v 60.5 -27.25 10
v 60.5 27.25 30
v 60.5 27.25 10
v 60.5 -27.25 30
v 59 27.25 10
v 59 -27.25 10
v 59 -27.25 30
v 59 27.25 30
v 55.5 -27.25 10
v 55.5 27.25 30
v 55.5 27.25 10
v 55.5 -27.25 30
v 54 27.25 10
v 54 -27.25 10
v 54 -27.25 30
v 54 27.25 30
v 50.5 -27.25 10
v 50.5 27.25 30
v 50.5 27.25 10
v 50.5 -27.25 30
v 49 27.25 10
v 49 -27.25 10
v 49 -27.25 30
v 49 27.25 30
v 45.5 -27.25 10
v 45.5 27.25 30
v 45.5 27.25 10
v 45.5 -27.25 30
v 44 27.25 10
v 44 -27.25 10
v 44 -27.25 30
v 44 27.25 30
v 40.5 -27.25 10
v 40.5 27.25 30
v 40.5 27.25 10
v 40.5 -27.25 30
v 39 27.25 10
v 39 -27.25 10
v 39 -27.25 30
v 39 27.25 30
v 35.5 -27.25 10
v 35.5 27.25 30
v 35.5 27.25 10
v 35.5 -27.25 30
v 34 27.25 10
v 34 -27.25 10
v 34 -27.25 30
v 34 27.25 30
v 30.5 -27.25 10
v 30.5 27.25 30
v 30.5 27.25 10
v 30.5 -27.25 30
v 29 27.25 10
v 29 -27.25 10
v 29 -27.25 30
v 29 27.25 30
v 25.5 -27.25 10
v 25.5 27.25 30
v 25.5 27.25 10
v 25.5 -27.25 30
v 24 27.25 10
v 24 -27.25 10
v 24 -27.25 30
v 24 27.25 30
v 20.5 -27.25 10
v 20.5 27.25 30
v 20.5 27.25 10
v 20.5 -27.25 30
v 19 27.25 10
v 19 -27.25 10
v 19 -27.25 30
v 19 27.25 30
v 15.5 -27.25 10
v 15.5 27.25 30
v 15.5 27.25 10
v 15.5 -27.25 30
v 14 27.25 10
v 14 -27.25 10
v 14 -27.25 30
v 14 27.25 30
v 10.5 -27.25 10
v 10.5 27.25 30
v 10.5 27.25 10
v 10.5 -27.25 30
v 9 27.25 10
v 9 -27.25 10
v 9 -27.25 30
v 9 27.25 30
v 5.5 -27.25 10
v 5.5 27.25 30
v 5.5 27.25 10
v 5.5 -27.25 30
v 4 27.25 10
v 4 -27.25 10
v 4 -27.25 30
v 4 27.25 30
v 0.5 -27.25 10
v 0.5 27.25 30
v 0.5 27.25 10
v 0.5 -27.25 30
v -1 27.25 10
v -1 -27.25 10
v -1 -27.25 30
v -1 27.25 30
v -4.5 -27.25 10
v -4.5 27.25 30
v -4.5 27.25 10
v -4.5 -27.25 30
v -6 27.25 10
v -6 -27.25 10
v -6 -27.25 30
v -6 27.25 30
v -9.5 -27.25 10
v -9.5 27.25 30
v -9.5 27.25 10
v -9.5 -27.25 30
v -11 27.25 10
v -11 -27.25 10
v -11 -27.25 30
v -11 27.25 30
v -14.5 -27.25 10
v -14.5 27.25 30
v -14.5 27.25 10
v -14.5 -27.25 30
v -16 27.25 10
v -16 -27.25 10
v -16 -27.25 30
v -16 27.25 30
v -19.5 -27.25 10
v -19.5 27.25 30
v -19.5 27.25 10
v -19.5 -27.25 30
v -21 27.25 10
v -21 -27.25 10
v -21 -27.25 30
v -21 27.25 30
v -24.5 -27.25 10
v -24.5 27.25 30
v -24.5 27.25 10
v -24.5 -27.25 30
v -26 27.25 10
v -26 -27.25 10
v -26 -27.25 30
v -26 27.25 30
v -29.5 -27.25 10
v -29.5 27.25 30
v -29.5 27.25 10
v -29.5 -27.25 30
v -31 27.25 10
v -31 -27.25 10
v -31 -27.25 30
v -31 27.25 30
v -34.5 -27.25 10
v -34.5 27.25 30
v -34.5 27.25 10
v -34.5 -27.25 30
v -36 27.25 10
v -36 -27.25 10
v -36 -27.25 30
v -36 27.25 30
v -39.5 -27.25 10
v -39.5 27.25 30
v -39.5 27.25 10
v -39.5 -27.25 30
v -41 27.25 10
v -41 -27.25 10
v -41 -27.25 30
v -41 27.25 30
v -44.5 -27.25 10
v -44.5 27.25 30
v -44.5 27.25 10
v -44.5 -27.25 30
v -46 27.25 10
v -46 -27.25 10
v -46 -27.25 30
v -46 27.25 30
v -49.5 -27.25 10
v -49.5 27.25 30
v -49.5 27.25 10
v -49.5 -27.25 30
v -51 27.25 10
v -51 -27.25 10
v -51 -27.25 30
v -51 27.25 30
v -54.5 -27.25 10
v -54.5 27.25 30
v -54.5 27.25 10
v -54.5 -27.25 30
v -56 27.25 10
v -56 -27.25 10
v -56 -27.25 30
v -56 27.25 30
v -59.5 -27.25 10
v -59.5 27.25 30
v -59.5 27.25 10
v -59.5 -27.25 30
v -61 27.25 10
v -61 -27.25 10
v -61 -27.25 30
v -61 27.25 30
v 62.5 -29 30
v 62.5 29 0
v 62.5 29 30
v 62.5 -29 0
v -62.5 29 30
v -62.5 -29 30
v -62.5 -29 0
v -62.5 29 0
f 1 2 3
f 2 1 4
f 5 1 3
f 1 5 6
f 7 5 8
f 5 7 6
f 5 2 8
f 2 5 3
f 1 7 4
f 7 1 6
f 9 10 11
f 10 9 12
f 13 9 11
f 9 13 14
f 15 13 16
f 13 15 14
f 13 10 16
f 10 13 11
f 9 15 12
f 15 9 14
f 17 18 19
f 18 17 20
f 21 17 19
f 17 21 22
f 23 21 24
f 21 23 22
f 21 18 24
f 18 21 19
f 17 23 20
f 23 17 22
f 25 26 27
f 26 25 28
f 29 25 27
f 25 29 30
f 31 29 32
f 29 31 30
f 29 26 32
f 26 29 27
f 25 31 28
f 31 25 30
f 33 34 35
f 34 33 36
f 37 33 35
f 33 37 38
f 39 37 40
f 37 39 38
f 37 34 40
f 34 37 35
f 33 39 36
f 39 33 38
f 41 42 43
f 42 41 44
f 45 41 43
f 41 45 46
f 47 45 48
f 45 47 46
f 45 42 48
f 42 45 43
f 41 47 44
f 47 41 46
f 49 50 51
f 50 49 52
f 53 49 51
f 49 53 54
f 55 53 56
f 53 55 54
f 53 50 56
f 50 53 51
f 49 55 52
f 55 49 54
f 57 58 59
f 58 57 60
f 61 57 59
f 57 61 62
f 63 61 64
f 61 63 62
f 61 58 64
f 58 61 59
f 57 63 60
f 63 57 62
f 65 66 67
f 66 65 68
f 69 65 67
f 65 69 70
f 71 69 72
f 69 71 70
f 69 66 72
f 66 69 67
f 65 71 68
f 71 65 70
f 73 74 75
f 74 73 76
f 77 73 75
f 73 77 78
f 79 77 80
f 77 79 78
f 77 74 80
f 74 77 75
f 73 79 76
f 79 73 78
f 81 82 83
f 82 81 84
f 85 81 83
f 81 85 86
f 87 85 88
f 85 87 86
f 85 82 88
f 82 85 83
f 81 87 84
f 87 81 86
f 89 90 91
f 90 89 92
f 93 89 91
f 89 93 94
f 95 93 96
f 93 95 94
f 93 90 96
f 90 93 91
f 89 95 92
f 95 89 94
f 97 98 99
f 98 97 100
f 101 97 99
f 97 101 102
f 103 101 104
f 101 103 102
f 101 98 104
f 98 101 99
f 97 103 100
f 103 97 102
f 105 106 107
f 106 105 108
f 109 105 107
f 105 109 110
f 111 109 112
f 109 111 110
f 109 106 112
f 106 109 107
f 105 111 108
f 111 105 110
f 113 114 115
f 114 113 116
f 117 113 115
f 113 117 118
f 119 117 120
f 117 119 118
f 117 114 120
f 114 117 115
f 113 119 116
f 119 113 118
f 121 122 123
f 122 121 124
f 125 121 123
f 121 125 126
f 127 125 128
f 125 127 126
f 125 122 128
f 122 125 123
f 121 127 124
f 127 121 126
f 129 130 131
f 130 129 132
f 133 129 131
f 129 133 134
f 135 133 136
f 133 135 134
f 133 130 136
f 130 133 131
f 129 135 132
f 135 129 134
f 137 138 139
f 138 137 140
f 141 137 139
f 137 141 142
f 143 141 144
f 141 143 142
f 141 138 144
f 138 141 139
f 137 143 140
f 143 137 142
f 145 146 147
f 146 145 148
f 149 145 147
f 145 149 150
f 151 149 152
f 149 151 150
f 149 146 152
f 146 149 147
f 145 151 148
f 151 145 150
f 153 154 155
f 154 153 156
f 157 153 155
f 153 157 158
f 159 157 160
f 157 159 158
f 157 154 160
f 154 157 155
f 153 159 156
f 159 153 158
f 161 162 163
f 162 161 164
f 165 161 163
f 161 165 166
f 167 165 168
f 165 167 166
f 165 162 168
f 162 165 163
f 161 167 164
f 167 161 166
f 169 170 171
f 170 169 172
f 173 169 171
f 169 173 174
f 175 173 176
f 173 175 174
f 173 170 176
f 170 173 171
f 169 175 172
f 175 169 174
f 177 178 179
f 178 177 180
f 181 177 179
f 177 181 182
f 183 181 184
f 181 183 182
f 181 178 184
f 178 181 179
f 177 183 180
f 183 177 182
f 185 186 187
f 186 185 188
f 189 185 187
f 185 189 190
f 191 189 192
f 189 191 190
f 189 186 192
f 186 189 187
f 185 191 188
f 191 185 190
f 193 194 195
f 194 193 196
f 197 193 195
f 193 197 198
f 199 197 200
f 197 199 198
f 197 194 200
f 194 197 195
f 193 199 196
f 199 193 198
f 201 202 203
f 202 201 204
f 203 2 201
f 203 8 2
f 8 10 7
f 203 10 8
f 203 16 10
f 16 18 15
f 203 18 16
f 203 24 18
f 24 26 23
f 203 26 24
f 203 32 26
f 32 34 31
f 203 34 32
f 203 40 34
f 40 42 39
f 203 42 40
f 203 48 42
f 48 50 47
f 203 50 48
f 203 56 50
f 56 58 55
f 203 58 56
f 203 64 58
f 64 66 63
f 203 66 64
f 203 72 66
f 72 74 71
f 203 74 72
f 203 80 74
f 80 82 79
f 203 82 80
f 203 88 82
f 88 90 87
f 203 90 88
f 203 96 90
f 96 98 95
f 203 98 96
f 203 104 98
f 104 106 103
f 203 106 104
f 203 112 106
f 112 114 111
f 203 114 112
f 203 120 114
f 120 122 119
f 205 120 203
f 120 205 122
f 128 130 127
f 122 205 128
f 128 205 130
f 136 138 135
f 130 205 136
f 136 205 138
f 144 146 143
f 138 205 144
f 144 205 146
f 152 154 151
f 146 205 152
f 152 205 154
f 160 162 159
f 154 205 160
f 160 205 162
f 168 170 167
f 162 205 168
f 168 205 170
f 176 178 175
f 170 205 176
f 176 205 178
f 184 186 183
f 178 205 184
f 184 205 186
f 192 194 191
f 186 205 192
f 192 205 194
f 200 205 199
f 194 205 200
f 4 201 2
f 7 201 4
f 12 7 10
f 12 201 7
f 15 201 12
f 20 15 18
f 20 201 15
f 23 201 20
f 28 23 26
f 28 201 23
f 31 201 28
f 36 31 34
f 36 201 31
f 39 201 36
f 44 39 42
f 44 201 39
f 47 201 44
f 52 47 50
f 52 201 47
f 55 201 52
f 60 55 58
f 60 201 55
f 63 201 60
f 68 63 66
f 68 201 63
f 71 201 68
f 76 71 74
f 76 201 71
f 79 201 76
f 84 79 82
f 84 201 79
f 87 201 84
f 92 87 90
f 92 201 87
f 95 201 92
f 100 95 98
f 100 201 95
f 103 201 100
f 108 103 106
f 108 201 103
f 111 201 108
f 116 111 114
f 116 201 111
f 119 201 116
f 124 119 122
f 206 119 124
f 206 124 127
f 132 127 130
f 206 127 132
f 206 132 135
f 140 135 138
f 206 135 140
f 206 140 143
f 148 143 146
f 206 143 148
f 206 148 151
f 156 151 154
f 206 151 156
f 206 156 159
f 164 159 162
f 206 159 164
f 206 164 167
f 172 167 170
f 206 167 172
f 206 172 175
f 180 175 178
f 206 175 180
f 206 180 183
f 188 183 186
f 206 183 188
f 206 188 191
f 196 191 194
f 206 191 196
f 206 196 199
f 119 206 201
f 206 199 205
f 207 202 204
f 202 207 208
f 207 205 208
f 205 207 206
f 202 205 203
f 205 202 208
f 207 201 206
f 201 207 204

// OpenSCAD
cardHolder(2, 4, 25);

module cardHolder(thickness, spacing, count) {
    difference() {
        translate([0,0,15])
        cube([count*1+(count-1)*spacing+thickness*2, 54+thickness*2, 30], center = true);
        for (i = [0:count-1]) {
            translate([(count*1+(count-1)*spacing+thickness*2)/2-0.75-thickness-(spacing+1)*i,0,85/2+10])
            cube([1.5,54.5,85], center = true);
        }
    }
}
